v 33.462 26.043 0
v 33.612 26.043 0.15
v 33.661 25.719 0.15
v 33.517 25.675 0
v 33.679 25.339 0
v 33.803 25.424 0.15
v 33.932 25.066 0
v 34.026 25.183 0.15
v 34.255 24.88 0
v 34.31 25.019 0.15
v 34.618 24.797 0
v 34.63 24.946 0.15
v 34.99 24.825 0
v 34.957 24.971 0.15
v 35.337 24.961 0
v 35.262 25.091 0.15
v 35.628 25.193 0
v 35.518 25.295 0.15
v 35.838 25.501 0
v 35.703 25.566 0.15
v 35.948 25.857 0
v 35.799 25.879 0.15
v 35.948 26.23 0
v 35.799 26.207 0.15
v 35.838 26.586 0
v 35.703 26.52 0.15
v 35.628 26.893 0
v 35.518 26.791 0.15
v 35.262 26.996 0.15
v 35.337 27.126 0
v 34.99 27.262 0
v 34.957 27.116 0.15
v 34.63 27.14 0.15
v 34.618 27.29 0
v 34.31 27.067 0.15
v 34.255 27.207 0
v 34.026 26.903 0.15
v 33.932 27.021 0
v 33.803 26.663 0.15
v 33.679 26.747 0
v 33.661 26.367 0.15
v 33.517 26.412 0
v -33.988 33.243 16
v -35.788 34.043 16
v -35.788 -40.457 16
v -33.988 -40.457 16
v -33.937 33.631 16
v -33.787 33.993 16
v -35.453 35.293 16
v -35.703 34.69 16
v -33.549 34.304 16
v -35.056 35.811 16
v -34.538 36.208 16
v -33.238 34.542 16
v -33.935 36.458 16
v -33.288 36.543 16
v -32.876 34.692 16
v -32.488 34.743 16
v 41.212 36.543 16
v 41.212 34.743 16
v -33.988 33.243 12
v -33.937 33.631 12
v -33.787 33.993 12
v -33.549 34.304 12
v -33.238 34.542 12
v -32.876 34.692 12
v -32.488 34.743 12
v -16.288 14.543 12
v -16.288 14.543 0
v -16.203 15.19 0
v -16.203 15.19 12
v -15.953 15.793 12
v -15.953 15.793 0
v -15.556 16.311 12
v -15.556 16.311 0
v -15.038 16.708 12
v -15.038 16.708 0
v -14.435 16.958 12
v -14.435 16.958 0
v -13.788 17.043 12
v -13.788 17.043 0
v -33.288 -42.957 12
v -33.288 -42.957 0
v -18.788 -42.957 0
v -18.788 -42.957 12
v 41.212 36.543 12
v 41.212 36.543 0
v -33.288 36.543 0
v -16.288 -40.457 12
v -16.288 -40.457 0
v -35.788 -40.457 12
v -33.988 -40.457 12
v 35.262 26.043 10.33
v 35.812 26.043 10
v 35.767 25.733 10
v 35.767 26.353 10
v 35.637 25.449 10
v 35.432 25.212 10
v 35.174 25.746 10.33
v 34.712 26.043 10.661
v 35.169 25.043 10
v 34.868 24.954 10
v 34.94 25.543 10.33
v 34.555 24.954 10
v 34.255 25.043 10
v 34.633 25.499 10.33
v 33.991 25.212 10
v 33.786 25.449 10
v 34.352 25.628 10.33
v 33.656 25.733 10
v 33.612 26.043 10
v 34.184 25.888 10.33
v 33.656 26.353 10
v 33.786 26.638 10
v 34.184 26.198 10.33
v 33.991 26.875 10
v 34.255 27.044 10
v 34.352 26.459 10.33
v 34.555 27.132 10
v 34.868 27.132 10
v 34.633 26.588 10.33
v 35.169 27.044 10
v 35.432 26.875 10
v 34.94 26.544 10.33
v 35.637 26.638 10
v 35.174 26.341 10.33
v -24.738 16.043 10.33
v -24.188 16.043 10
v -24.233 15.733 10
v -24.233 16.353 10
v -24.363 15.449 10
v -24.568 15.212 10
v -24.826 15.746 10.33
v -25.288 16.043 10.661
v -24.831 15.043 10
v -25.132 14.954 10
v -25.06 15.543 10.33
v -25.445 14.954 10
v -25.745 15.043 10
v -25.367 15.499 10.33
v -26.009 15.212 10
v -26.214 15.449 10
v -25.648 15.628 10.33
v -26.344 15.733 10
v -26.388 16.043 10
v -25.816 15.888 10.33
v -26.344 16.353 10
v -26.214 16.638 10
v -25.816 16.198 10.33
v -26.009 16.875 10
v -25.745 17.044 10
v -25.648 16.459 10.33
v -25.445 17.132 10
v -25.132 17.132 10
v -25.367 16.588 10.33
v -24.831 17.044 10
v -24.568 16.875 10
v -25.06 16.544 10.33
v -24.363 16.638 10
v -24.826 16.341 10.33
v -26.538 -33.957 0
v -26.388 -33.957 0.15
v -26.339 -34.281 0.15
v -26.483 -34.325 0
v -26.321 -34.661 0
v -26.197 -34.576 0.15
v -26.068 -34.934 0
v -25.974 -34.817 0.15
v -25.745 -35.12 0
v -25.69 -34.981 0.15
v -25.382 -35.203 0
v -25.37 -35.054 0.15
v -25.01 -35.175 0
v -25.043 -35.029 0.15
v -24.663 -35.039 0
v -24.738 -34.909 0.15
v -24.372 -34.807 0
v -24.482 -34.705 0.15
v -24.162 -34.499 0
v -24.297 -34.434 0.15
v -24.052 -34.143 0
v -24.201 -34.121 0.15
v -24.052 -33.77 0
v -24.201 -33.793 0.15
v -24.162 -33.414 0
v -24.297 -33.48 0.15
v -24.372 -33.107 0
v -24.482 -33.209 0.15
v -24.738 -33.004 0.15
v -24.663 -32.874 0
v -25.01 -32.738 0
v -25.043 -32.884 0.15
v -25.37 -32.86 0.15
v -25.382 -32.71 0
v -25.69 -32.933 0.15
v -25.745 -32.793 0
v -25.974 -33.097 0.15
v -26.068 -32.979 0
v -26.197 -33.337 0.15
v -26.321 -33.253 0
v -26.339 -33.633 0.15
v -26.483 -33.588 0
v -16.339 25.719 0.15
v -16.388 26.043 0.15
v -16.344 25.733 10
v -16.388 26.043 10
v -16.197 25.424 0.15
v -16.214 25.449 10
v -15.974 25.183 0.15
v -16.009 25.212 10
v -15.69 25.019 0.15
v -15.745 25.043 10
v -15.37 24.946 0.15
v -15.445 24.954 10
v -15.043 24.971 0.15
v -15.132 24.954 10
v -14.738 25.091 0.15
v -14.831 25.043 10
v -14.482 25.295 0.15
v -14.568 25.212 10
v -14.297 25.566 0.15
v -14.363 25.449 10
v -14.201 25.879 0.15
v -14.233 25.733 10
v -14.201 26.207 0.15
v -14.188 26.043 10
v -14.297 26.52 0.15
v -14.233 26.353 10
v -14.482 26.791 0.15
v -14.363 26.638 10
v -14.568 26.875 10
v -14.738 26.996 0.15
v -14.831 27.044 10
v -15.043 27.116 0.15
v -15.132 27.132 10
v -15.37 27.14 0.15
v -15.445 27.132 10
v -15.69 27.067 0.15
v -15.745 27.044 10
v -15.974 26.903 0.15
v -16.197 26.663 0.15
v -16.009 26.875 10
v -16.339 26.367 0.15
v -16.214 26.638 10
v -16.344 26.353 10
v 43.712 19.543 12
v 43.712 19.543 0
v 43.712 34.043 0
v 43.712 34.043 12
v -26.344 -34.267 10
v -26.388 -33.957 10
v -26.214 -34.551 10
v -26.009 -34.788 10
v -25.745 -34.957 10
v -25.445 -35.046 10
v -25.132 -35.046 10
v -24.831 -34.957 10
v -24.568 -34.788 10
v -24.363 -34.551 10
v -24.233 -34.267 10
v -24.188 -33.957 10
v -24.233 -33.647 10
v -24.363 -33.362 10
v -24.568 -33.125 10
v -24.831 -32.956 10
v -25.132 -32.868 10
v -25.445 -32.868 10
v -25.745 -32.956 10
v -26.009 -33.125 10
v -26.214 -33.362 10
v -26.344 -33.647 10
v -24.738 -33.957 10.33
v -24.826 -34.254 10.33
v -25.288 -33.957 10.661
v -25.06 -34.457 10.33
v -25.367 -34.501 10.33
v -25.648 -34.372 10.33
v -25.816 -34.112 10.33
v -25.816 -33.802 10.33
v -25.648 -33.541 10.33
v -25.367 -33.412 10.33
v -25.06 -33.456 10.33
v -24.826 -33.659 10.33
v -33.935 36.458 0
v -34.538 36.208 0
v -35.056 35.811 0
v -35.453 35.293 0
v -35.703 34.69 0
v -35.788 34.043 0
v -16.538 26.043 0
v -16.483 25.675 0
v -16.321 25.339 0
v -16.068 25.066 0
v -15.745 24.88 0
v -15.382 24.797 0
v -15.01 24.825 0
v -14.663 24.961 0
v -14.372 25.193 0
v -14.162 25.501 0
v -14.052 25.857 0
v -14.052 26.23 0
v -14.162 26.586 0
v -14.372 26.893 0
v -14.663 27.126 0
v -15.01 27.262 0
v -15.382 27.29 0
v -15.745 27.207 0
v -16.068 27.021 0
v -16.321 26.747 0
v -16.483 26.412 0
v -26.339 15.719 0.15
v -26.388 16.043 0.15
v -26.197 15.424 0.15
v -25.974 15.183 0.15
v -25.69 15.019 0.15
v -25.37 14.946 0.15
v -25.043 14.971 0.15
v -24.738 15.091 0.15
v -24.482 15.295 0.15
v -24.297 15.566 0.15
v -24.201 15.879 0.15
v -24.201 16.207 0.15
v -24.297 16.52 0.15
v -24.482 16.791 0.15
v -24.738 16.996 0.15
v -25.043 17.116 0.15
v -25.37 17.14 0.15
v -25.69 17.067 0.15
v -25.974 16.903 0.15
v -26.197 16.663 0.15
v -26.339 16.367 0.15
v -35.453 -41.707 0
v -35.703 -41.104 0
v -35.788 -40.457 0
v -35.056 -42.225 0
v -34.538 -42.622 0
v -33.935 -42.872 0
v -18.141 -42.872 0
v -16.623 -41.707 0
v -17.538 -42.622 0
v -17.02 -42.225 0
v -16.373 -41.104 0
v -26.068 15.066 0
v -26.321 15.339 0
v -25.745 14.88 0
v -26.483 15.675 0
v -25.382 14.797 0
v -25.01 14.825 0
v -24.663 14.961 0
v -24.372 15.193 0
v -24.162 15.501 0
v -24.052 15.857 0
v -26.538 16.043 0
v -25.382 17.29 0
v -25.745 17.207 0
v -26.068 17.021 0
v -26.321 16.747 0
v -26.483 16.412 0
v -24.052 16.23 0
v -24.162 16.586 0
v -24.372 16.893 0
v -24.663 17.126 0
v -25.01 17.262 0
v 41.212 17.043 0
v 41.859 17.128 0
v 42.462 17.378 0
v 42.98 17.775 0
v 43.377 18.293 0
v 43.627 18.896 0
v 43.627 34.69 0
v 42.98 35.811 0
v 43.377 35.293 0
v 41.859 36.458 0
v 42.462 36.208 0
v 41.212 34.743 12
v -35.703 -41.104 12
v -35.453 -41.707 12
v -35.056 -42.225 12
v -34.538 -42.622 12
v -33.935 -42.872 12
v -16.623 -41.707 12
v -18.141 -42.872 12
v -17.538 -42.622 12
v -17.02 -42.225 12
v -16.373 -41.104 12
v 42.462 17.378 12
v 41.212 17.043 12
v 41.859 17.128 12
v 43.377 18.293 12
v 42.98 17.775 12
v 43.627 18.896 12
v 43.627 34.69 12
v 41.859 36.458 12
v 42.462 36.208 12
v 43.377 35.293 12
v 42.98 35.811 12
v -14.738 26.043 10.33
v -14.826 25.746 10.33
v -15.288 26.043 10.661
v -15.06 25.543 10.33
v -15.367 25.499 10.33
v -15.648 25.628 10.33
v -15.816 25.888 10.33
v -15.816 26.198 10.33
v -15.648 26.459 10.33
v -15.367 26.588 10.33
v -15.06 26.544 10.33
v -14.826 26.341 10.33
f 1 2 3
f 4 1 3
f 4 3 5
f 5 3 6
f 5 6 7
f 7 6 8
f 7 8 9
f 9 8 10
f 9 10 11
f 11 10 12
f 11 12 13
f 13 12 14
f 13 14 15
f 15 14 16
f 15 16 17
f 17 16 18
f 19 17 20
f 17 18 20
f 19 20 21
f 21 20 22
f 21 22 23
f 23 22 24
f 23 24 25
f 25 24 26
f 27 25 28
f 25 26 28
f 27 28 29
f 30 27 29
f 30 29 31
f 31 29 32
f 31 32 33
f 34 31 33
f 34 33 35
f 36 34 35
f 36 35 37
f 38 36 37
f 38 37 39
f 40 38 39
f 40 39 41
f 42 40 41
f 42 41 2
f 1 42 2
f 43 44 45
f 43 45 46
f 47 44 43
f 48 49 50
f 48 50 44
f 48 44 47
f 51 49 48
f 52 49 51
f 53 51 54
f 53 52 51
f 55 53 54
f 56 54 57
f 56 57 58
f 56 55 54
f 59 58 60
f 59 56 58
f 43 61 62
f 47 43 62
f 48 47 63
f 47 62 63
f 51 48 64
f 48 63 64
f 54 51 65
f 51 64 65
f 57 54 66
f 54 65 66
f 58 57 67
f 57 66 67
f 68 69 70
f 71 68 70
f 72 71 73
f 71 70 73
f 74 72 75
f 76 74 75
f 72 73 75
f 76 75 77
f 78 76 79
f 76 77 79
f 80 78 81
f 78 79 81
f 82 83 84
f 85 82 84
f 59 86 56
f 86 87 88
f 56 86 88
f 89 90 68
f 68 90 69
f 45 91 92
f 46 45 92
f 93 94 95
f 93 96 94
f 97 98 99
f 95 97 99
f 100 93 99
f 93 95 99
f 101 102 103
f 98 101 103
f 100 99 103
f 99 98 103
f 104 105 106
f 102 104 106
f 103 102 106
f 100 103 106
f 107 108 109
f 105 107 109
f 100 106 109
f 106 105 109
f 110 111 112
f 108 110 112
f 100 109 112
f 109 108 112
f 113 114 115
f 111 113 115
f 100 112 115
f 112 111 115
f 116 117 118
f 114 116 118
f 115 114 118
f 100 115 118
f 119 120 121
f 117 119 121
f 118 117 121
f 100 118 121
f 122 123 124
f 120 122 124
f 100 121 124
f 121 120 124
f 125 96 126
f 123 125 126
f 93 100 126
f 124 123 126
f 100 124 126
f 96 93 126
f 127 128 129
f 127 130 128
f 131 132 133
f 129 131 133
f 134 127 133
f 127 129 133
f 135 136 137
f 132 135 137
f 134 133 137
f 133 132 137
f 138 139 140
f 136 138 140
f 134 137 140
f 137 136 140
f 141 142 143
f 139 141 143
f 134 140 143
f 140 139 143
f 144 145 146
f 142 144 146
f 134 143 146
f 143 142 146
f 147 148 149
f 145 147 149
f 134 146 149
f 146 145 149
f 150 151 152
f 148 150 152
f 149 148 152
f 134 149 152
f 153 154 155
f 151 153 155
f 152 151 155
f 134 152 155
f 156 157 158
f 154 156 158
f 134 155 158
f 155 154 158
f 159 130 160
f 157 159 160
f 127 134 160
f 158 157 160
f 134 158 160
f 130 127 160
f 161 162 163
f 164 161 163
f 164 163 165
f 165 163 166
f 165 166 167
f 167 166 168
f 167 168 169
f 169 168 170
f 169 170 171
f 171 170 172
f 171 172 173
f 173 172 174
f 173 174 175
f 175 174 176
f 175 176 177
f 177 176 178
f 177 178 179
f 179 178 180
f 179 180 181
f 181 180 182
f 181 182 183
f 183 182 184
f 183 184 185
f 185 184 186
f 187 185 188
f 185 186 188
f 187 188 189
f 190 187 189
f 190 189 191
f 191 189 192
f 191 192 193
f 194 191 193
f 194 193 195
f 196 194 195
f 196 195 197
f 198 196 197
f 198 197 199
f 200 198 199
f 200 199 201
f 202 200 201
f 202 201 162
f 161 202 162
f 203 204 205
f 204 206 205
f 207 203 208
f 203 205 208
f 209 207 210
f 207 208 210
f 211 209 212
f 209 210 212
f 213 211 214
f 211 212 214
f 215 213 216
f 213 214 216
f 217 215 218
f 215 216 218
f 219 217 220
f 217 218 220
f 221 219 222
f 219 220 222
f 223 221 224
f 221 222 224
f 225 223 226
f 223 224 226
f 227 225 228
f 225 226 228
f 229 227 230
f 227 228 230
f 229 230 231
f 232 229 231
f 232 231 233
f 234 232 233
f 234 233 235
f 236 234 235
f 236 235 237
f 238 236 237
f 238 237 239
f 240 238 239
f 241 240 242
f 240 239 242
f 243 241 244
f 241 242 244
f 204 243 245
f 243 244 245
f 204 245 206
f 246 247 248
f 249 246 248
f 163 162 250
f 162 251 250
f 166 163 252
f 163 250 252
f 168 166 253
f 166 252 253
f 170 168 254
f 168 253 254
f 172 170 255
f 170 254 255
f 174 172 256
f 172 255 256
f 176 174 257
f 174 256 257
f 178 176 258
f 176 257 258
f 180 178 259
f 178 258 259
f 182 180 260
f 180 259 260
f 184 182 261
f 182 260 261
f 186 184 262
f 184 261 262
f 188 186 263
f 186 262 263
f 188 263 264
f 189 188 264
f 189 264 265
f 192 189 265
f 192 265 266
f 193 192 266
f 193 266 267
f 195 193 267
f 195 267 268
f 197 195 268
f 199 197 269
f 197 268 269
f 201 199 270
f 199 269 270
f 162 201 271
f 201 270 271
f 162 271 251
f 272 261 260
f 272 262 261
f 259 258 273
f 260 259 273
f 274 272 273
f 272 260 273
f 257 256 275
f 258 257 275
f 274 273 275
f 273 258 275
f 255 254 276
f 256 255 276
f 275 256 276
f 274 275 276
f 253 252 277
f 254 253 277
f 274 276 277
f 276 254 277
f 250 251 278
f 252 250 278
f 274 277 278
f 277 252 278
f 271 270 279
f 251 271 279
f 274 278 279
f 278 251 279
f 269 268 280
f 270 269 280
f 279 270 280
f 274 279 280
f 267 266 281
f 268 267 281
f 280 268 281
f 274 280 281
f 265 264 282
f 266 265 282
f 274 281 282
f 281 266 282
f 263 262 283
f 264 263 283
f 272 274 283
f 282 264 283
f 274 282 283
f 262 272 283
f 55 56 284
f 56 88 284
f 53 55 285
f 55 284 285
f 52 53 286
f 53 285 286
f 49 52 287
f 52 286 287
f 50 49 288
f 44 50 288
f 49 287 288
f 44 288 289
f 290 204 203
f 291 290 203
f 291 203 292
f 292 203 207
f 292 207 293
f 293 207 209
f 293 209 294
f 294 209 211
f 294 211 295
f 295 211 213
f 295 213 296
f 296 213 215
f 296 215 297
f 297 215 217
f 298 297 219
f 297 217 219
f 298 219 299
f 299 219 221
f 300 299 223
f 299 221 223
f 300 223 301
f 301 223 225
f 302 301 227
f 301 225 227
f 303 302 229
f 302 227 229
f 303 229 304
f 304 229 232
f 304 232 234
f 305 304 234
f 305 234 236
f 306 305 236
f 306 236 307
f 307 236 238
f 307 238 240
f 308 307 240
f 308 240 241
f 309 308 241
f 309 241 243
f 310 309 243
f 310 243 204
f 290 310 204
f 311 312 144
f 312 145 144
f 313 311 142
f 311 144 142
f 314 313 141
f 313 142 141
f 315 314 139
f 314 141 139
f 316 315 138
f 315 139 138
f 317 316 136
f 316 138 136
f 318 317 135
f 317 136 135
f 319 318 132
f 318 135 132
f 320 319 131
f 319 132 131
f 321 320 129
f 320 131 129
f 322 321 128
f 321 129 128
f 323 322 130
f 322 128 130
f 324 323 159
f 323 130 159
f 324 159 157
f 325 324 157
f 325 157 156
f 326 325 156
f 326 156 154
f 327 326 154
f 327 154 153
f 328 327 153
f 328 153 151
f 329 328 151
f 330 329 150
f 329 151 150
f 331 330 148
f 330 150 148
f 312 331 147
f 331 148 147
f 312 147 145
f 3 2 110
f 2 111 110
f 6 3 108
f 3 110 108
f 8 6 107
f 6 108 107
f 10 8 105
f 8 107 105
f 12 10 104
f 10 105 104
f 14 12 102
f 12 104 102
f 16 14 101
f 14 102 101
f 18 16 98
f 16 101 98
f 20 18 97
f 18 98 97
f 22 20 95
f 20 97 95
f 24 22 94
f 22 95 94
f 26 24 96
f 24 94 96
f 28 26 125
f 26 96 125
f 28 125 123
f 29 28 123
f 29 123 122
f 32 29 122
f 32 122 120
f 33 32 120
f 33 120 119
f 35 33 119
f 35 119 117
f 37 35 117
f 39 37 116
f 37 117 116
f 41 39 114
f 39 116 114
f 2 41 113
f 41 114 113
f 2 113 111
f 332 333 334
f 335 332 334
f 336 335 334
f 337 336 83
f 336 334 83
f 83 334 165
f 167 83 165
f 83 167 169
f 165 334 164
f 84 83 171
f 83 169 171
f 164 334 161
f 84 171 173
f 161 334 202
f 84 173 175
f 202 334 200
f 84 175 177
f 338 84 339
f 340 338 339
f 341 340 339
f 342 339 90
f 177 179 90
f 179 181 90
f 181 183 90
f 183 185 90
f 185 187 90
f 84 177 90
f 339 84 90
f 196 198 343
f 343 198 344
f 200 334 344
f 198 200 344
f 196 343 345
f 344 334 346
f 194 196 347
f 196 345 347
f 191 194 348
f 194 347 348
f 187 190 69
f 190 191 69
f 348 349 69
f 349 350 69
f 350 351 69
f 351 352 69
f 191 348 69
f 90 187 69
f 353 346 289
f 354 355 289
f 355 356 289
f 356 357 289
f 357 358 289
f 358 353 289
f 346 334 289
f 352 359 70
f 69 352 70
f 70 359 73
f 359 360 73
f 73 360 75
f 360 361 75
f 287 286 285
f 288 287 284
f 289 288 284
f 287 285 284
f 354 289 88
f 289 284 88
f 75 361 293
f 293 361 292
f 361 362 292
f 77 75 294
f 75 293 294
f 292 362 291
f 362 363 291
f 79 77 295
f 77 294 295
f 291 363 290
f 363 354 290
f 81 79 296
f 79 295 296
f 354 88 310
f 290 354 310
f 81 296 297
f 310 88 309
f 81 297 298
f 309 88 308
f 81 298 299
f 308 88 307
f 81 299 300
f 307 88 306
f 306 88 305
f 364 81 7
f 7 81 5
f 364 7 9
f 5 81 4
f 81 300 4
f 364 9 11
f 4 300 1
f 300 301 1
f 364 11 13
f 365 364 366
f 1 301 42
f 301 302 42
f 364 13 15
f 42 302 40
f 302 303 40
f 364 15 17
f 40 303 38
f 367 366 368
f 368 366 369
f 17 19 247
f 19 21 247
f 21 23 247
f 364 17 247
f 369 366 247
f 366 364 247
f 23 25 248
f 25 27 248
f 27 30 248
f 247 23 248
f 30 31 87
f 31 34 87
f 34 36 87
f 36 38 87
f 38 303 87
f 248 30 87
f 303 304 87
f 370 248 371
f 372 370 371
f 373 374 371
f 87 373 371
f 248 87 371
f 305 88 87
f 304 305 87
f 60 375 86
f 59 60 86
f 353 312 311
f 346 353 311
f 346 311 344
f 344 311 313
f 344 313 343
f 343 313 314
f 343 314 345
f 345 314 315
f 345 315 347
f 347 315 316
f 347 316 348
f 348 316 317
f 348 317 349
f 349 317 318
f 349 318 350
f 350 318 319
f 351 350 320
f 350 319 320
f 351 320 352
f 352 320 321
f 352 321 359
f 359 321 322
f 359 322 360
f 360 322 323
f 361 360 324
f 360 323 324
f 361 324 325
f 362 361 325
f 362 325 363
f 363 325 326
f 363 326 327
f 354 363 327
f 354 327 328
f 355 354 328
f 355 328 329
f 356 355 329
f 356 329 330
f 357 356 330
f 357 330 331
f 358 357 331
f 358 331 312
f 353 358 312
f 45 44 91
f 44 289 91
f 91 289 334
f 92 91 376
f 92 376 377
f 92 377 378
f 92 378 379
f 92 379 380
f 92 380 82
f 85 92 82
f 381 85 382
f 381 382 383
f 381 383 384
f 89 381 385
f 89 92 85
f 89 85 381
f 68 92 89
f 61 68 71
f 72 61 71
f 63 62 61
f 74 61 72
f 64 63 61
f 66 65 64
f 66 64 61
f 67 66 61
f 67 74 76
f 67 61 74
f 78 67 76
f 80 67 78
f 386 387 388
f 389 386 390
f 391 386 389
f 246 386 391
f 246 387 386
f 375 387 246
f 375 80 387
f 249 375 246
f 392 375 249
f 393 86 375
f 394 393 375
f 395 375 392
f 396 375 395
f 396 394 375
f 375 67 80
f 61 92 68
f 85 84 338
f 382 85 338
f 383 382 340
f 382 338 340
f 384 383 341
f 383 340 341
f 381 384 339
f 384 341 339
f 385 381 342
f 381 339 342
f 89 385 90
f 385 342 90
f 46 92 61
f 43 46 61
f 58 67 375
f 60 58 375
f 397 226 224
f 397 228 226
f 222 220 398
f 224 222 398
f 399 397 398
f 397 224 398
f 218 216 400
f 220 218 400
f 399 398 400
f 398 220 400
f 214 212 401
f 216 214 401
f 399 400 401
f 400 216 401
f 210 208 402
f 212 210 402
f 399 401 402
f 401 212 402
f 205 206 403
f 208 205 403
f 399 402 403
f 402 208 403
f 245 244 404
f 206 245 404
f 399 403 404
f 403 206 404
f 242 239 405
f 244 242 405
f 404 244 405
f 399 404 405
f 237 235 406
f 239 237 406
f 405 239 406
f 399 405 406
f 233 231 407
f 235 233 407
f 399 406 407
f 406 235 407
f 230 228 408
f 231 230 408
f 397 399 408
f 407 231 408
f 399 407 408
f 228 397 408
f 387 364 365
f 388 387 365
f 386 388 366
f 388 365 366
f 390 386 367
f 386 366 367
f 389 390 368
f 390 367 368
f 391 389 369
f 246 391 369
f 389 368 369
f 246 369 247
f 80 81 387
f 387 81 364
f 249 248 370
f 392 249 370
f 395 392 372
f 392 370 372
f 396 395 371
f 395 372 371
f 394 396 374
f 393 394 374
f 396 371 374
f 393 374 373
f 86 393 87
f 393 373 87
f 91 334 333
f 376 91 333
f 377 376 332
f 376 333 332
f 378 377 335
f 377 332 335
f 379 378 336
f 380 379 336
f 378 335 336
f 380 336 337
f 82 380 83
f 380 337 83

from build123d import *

# Parameters (mm, degrees)
F1_DEPTH       = 12
F3_DEPTH       = 4
F5_D           = 2.2
F5_DEPTH       = 10
F5_CSINK_D     = 2.5
F5_CSINK_ANGLE = 90
F5_TIP         = 0.6609466809
F6_D           = 2.2
F6_DEPTH       = 10
F6_CSINK_D     = 2.5
F6_CSINK_ANGLE = 90
F6_TIP         = 0.6609466809
F7_D           = 2.2
F7_DEPTH       = 10
F7_CSINK_D     = 2.5
F7_CSINK_ANGLE = 90
F7_TIP         = 0.6609466809
F8_D           = 2.2
F8_DEPTH       = 10
F8_CSINK_D     = 2.5
F8_CSINK_ANGLE = 90
F8_TIP         = 0.6609466809


with BuildPart() as f1:
    # F0 (on Top) → F1 (new body)
    with BuildSketch(Plane.XY):
        with BuildLine():
            Line((41.2117568254, 36.543219165), (-33.2882431746, 36.543219165))
            ThreePointArc((-33.2882431746, 36.543219165), (-35.0560101275, 35.810986118), (-35.7882431746, 34.043219165))
            Line((-35.7882431746, 34.043219165), (-35.7882431746, -40.456780835))
            ThreePointArc((-35.7882431746, -40.456780835), (-35.0560101275, -42.2245477879), (-33.2882431746, -42.956780835))
            Line((-33.2882431746, -42.956780835), (-18.7882431746, -42.956780835))
            ThreePointArc((-18.7882431746, -42.956780835), (-17.0204762216, -42.2245477879), (-16.2882431746, -40.456780835))
            Line((-16.2882431746, -40.456780835), (-16.2882431746, 14.543219165))
            ThreePointArc((-16.2882431746, 14.543219165), (-15.5560101275, 16.310986118), (-13.7882431746, 17.043219165))
            Line((-13.7882431746, 17.043219165), (41.2117568254, 17.043219165))
            ThreePointArc((41.2117568254, 17.043219165), (42.9795237784, 17.7754522121), (43.7117568254, 19.543219165))
            Line((43.7117568254, 19.543219165), (43.7117568254, 34.043219165))
            ThreePointArc((43.7117568254, 34.043219165), (42.9795237784, 35.810986118), (41.2117568254, 36.543219165))
        make_face()
    extrude(amount=F1_DEPTH)

    # F2 (on face) → F3 (join)
    with BuildSketch(Plane.XY.offset(12)):
        with BuildLine():
            ThreePointArc((-33.9882431746, 33.243219165), (-33.5489033463, 34.3038793368), (-32.4882431746, 34.743219165))
            Line((-32.4882431746, 34.743219165), (41.2117568254, 34.743219165))
            Line((41.2117568254, 34.743219165), (41.2117568254, 36.543219165))
            Line((41.2117568254, 36.543219165), (-33.2882431746, 36.543219165))
            ThreePointArc((-33.2882431746, 36.543219165), (-35.0560101275, 35.810986118), (-35.7882431746, 34.043219165))
            Line((-35.7882431746, 34.043219165), (-35.7882431746, -40.456780835))
            Line((-35.7882431746, -40.456780835), (-33.9882431746, -40.456780835))
            Line((-33.9882431746, -40.456780835), (-33.9882431746, 33.243219165))
        make_face()
    extrude(amount=F3_DEPTH)

    # F5
    with Locations(Plane(origin=(0, 0, 0), x_dir=(1, 0, 0), z_dir=(0, 0, -1))):
        with Locations((34.7117568254, -26.043219165)):
            CounterSinkHole(F5_D / 2, F5_CSINK_D / 2, depth=F5_DEPTH, counter_sink_angle=F5_CSINK_ANGLE)
            with Locations((0, 0, -(F5_DEPTH + F5_TIP / 2))):  # 118° drill point
                Cone(0, F5_D / 2, F5_TIP, mode=Mode.SUBTRACT)

    # F6
    with Locations(Plane(origin=(0, 0, 0), x_dir=(1, 0, 0), z_dir=(0, 0, -1))):
        with Locations((-15.2882431746, -26.043219165)):
            CounterSinkHole(F6_D / 2, F6_CSINK_D / 2, depth=F6_DEPTH, counter_sink_angle=F6_CSINK_ANGLE)
            with Locations((0, 0, -(F6_DEPTH + F6_TIP / 2))):  # 118° drill point
                Cone(0, F6_D / 2, F6_TIP, mode=Mode.SUBTRACT)

    # F7
    with Locations(Plane(origin=(0, 0, 0), x_dir=(1, 0, 0), z_dir=(0, 0, -1))):
        with Locations((-25.2882431746, -16.043219165)):
            CounterSinkHole(F7_D / 2, F7_CSINK_D / 2, depth=F7_DEPTH, counter_sink_angle=F7_CSINK_ANGLE)
            with Locations((0, 0, -(F7_DEPTH + F7_TIP / 2))):  # 118° drill point
                Cone(0, F7_D / 2, F7_TIP, mode=Mode.SUBTRACT)

    # F8
    with Locations(Plane(origin=(0, 0, 0), x_dir=(1, 0, 0), z_dir=(0, 0, -1))):
        with Locations((-25.2882431746, 33.956780835)):
            CounterSinkHole(F8_D / 2, F8_CSINK_D / 2, depth=F8_DEPTH, counter_sink_angle=F8_CSINK_ANGLE)
            with Locations((0, 0, -(F8_DEPTH + F8_TIP / 2))):  # 118° drill point
                Cone(0, F8_D / 2, F8_TIP, mode=Mode.SUBTRACT)


solid = f1.part
